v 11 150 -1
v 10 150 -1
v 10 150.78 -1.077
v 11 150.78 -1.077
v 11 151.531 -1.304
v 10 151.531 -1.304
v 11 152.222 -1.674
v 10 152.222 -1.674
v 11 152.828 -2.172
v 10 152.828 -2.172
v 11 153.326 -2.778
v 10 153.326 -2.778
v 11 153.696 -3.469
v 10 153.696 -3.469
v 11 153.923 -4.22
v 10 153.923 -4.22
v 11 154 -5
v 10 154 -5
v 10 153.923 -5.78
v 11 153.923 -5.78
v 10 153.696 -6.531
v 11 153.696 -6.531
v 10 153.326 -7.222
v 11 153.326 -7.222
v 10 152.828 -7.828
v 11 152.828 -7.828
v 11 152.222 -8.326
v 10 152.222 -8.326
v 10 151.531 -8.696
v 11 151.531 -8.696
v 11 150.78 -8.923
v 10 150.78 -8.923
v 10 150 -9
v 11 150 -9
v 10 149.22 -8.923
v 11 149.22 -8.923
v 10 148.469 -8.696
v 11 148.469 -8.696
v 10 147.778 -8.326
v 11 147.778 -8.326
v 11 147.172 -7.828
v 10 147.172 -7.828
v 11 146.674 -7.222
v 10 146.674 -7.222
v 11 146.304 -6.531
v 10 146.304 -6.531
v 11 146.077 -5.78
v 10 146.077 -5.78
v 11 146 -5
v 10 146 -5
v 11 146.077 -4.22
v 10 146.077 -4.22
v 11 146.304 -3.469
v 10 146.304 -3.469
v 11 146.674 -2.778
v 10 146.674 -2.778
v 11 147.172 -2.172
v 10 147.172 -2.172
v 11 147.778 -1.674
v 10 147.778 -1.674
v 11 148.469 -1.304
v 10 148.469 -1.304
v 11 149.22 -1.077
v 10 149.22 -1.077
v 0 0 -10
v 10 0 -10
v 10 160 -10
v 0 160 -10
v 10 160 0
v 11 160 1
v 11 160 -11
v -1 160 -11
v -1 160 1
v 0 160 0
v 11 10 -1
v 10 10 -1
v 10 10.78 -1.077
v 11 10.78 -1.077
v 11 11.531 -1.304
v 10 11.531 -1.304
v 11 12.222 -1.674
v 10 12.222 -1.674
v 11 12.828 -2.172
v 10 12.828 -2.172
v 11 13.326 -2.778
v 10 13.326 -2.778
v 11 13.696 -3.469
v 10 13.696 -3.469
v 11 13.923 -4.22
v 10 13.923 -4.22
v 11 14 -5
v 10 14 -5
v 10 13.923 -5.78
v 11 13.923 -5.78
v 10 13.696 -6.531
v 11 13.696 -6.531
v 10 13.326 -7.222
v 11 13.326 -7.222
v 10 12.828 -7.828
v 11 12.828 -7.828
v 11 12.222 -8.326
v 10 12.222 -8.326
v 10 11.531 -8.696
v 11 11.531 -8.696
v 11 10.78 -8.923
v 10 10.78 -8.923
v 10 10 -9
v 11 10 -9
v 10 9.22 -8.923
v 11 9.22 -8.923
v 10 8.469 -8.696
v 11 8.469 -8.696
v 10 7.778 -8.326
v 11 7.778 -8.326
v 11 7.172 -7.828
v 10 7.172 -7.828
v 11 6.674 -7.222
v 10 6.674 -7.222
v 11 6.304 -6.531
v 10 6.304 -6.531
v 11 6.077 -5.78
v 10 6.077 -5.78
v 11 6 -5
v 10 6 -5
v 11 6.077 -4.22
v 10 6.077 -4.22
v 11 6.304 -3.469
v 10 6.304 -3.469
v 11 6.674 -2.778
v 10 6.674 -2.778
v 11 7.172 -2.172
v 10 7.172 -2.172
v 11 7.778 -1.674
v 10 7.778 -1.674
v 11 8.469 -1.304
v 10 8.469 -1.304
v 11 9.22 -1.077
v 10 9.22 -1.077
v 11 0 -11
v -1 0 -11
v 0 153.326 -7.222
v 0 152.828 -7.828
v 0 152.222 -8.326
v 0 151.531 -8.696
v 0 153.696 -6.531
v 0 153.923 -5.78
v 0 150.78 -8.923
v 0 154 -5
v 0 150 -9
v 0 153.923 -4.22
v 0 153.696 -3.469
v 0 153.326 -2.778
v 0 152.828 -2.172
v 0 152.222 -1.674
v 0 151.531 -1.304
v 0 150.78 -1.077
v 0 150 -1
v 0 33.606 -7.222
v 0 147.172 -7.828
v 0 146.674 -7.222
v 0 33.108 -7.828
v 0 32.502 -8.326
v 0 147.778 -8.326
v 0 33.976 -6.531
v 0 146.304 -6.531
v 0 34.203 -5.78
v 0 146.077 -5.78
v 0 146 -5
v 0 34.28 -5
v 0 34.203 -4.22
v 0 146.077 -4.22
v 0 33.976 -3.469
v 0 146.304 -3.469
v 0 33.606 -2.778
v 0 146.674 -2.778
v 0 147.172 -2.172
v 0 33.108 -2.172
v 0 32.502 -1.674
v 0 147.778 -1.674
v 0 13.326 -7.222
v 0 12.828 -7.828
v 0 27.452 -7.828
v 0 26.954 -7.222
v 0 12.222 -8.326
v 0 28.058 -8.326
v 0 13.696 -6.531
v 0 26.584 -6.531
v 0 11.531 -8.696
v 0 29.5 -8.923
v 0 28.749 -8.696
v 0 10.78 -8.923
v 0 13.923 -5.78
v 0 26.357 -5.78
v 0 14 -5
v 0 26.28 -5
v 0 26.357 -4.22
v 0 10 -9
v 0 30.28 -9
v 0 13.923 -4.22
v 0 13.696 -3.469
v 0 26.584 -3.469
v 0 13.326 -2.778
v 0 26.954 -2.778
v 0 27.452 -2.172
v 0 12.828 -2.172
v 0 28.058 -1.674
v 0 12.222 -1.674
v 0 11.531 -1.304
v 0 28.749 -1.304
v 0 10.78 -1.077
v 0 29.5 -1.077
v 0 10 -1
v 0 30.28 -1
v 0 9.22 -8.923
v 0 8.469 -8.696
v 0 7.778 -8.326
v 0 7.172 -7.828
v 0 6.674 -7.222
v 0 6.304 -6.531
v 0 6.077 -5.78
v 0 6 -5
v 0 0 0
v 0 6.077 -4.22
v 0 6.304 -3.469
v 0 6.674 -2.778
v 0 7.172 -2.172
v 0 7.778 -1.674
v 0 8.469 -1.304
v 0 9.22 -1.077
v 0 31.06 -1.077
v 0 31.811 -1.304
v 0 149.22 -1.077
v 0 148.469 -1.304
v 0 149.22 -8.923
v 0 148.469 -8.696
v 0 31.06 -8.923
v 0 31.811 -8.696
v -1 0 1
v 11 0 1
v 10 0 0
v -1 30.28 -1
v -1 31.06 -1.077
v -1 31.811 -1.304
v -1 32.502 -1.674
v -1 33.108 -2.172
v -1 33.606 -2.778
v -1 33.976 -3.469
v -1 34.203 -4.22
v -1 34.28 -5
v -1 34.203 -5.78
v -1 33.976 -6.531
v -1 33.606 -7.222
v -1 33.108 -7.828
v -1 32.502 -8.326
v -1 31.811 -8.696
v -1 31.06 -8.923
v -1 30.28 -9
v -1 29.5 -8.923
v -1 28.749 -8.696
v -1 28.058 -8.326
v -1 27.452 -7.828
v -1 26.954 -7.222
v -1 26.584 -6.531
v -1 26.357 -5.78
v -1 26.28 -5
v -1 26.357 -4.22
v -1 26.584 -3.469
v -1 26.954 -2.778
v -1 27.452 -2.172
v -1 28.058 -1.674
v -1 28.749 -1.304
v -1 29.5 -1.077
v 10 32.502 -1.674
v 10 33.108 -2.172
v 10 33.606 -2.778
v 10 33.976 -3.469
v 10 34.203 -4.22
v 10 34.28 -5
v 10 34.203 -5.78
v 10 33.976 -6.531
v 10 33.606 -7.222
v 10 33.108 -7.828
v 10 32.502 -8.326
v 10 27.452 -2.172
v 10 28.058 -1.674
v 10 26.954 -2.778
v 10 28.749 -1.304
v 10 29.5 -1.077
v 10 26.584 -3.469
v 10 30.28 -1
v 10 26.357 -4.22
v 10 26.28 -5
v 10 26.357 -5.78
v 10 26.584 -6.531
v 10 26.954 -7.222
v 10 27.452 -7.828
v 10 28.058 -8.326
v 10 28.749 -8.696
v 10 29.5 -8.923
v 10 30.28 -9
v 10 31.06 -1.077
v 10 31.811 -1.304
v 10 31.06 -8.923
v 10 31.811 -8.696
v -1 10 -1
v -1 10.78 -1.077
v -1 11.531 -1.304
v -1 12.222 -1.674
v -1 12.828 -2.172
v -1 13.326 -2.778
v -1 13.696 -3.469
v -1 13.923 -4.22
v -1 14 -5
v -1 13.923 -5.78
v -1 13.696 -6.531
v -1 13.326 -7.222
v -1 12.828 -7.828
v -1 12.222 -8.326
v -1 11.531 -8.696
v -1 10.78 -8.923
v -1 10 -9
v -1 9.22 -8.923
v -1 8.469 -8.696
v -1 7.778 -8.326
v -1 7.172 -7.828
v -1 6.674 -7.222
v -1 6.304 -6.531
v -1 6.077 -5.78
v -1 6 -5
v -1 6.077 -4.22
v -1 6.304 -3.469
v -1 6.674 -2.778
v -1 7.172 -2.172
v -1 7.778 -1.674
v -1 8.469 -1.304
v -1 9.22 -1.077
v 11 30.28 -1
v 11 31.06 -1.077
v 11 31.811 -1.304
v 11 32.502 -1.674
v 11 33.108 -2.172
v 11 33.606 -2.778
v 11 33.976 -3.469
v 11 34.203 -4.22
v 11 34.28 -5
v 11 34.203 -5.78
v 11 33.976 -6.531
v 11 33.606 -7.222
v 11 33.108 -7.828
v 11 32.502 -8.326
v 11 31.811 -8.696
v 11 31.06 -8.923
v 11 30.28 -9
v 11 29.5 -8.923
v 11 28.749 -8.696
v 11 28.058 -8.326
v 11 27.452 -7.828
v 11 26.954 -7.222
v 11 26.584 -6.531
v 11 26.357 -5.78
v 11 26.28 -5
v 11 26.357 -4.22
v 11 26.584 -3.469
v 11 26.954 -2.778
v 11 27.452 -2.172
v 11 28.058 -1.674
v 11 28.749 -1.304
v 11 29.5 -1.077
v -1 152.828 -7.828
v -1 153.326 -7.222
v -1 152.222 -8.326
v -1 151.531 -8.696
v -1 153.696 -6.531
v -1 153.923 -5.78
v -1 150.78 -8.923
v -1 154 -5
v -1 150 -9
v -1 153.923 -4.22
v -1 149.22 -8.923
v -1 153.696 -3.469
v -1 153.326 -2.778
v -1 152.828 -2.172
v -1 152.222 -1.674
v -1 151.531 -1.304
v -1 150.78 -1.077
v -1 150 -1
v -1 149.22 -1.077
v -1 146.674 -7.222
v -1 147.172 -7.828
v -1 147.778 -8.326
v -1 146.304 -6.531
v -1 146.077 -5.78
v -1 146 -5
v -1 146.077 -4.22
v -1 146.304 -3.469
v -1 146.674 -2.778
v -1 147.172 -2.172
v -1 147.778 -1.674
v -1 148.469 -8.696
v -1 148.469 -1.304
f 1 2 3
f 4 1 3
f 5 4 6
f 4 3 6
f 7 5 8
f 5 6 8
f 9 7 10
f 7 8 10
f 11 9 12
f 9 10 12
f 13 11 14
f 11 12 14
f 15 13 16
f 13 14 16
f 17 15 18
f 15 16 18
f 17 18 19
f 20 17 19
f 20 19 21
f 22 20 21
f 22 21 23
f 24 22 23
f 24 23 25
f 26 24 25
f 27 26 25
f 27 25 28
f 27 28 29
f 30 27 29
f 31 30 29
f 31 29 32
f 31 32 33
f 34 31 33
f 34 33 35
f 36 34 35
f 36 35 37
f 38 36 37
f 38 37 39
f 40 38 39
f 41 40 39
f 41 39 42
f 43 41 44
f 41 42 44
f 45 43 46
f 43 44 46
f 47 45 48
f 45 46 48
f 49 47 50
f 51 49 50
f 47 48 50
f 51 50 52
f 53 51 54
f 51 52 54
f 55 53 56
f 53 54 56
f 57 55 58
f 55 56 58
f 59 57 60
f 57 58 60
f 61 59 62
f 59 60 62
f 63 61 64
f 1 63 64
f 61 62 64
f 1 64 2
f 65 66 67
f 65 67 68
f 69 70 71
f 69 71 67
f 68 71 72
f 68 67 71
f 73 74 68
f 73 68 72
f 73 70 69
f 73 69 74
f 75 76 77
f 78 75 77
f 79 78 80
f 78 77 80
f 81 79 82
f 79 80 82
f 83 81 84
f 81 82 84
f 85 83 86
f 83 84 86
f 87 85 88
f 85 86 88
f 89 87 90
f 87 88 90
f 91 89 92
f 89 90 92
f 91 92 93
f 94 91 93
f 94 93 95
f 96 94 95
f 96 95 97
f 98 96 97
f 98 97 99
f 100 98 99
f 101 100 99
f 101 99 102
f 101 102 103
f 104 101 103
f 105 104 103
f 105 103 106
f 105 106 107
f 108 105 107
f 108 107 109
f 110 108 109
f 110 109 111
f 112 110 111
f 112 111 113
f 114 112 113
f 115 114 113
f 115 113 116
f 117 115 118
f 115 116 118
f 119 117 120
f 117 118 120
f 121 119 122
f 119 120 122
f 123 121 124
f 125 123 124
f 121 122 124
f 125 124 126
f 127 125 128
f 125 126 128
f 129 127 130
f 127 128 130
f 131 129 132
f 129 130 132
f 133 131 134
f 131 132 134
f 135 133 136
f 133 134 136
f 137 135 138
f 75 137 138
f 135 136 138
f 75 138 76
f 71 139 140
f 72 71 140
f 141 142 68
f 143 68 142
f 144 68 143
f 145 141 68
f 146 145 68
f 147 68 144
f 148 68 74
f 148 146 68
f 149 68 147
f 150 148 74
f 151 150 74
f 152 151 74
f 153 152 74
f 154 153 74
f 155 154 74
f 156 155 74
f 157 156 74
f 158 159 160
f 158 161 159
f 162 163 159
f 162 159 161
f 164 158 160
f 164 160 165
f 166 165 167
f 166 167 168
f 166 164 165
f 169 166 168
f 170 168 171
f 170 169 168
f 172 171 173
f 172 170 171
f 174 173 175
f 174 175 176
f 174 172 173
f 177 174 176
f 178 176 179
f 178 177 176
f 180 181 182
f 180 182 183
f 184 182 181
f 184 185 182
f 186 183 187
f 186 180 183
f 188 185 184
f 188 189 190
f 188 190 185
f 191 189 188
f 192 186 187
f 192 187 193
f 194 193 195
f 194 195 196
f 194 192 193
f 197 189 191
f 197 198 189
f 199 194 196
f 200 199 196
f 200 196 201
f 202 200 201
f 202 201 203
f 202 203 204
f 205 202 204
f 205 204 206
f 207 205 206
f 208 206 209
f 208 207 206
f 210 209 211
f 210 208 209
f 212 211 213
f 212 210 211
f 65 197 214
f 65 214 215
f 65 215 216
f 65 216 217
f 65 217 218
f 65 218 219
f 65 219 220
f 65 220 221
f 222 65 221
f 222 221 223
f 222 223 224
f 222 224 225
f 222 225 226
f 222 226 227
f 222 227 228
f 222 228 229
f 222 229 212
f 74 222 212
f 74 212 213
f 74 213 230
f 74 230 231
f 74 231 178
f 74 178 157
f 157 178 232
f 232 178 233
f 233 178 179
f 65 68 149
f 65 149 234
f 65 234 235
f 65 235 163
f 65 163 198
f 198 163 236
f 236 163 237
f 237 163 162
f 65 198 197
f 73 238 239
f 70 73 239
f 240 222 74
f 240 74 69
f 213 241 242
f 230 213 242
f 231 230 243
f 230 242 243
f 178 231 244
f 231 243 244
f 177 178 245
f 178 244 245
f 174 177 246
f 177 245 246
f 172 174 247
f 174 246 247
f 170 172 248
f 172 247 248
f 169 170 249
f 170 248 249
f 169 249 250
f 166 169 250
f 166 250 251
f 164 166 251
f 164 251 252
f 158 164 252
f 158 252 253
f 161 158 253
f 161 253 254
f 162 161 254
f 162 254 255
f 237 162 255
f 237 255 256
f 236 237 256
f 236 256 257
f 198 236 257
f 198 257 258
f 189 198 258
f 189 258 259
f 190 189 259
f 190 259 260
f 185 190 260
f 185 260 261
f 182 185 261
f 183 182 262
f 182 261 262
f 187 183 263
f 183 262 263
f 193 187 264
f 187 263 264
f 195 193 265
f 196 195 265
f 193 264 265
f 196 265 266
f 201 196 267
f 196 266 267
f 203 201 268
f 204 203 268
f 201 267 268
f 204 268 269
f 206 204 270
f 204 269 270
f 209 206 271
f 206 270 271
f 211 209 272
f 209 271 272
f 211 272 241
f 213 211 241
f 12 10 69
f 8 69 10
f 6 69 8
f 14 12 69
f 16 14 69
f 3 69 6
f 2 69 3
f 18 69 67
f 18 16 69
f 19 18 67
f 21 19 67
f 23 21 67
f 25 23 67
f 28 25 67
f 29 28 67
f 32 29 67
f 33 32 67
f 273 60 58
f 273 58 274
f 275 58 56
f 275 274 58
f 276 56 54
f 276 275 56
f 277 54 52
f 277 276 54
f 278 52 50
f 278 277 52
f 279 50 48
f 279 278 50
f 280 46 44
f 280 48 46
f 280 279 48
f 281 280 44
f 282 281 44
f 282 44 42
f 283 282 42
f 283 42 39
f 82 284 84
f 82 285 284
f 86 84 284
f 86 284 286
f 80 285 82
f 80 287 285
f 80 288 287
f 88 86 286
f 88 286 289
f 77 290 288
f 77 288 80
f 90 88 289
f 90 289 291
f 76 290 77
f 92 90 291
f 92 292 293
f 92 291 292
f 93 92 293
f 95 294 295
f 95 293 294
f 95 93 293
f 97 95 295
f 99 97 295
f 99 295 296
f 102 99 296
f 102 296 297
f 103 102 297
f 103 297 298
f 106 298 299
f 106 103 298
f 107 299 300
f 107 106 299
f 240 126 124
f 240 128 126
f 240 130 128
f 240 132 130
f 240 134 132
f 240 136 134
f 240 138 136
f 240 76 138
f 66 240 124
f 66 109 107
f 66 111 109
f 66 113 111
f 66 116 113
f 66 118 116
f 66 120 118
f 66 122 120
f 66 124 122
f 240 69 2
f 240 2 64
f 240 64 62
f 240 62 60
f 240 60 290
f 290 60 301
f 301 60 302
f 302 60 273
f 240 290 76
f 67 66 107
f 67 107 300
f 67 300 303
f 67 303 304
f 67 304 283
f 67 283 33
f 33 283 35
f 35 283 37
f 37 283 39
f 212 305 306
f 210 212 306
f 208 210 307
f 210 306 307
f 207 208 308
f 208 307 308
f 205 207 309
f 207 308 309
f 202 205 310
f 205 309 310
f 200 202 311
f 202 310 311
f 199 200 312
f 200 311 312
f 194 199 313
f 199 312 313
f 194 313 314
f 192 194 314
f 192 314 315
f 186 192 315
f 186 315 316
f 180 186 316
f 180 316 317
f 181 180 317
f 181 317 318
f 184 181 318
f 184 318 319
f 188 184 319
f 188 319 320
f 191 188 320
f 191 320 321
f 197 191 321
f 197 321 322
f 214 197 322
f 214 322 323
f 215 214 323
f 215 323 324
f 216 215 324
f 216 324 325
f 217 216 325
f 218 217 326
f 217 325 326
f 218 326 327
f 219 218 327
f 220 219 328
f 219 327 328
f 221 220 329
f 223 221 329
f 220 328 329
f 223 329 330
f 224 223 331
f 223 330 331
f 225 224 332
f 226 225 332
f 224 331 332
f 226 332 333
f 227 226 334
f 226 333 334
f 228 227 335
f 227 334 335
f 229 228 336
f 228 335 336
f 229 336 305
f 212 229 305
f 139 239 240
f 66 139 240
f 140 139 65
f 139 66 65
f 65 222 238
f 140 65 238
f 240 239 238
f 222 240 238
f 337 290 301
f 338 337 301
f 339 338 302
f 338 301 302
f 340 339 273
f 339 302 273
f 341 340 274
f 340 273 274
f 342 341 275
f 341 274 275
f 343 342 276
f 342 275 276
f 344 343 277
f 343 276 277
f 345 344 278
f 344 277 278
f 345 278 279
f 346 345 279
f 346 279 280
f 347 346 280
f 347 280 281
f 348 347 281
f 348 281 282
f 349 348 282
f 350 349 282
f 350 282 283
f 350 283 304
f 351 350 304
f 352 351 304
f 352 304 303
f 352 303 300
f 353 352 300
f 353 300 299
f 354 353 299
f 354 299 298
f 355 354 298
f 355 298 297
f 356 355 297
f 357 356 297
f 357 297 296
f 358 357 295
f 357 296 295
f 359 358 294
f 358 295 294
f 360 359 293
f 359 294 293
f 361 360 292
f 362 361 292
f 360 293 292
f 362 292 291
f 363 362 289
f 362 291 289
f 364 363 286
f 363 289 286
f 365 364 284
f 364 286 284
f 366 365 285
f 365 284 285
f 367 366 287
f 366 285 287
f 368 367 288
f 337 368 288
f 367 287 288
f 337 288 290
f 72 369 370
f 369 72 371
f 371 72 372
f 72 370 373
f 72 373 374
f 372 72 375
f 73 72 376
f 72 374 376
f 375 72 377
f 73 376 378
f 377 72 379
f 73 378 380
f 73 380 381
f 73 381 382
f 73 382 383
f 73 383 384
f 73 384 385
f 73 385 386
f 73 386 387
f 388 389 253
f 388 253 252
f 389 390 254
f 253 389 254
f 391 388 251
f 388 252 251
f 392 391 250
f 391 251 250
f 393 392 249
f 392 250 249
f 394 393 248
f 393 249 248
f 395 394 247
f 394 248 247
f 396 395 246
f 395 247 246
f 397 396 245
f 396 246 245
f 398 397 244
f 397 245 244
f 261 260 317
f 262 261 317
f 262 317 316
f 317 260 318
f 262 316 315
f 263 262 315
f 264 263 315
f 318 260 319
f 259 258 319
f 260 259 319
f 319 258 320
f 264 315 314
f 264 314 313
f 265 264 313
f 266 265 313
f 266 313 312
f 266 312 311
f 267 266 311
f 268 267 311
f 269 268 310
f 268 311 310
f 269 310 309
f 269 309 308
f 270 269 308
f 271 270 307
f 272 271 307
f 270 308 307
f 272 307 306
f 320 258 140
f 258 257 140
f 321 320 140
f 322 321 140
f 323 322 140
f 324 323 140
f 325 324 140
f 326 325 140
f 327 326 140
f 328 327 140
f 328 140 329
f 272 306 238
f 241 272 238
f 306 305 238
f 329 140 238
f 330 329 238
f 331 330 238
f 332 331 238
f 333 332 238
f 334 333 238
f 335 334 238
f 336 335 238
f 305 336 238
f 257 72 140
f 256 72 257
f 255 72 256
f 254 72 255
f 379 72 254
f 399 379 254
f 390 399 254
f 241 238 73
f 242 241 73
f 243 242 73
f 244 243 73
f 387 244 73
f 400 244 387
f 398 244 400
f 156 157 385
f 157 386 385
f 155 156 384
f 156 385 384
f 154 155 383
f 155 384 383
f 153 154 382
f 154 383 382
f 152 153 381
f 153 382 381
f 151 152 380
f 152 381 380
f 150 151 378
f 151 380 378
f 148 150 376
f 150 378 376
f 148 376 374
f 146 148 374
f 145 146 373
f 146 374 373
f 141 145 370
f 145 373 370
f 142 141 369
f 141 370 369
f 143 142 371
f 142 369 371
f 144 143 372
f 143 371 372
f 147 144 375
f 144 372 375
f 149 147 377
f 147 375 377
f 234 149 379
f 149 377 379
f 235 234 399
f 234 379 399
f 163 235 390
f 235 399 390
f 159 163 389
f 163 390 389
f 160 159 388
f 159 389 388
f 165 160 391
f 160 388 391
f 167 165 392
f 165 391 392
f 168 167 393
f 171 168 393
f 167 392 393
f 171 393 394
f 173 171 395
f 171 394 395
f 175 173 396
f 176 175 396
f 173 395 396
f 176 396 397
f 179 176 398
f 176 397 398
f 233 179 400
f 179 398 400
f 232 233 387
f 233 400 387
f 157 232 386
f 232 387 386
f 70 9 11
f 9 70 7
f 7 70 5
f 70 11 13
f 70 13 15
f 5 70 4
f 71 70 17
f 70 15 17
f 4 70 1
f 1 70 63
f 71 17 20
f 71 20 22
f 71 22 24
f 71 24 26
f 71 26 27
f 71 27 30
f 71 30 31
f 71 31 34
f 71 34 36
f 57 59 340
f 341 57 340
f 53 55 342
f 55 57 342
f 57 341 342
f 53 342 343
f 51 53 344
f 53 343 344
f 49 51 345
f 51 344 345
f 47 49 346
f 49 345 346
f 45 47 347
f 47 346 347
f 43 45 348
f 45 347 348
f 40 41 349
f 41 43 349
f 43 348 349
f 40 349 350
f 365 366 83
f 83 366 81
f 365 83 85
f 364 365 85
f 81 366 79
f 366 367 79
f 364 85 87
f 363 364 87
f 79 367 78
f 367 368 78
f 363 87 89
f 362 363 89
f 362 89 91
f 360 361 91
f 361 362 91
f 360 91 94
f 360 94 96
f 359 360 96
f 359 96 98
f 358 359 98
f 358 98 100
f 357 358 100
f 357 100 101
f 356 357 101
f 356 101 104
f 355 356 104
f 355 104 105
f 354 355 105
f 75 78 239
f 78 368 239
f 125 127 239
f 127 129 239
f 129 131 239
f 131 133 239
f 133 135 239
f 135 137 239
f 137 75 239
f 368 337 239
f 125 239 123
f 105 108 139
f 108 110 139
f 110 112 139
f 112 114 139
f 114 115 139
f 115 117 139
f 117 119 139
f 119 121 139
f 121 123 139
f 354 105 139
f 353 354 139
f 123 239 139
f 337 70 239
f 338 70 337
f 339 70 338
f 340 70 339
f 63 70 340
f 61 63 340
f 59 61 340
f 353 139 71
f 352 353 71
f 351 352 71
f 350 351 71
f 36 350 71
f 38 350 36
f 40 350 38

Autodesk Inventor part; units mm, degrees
ref_plane "YZ Plane" through (0, 0, 0) normal (1, 0, 0) x (0, 1, 0)
ref_plane "XZ Plane" through (0, 0, 0) normal (0, 1, 0) x (-1, 0, 0)
ref_plane "XY Plane" through (0, 0, 0) normal (0, 0, 1) x (1, 0, 0)
sketch "Boceto1" plane through (0, 0, 0) normal (0, 1, 0) x (-1, 0, 0)
  line L0 (0, 0) -> (-10, 0)
  line L1 (-10, 0) -> (-10, -10)
  line L2 (-10, -10) -> (0, -10)
  line L3 (0, -10) -> (0, 0)
  line L4 (1, 1) -> (-11, 1)
  line L5 (-11, 1) -> (-11, -11)
  line L6 (-11, -11) -> (1, -11)
  line L7 (1, -11) -> (1, 1)
  dimension "d0" = 10
  dimension "d2" = 12
  dimension "d4" = 1
  dimension "d5" = 1
extrude "Extrusión1" add sketch "Boceto1" along normal blind 160
sketch "Boceto2" plane through (-1, 0, -11) normal (-1, 0, 0) x (0, 0, 1)
  circle A0 centre (6, 10) radius 4
  circle A1 centre (6, 30.28) radius 4
  line L0 (0, 0) -> (12, 0) projected
  line L1 (0, 0) -> (0, 160) projected
  circle A2 centre (6, 150) radius 4
  line L2 (0, 160) -> (12, 160) projected
  dimension "d8" = 8
  dimension "d9" = 8
  dimension "d11" = 20.28
  dimension "d14" = 10
  dimension "d15" = 6
  dimension "d16" = 6
  dimension "d17" = 8
  dimension "d18" = 6
  dimension "d19" = 10
extrude "Extrusión2" cut sketch "Boceto2" against normal blind 20
properties part number "brazo"
